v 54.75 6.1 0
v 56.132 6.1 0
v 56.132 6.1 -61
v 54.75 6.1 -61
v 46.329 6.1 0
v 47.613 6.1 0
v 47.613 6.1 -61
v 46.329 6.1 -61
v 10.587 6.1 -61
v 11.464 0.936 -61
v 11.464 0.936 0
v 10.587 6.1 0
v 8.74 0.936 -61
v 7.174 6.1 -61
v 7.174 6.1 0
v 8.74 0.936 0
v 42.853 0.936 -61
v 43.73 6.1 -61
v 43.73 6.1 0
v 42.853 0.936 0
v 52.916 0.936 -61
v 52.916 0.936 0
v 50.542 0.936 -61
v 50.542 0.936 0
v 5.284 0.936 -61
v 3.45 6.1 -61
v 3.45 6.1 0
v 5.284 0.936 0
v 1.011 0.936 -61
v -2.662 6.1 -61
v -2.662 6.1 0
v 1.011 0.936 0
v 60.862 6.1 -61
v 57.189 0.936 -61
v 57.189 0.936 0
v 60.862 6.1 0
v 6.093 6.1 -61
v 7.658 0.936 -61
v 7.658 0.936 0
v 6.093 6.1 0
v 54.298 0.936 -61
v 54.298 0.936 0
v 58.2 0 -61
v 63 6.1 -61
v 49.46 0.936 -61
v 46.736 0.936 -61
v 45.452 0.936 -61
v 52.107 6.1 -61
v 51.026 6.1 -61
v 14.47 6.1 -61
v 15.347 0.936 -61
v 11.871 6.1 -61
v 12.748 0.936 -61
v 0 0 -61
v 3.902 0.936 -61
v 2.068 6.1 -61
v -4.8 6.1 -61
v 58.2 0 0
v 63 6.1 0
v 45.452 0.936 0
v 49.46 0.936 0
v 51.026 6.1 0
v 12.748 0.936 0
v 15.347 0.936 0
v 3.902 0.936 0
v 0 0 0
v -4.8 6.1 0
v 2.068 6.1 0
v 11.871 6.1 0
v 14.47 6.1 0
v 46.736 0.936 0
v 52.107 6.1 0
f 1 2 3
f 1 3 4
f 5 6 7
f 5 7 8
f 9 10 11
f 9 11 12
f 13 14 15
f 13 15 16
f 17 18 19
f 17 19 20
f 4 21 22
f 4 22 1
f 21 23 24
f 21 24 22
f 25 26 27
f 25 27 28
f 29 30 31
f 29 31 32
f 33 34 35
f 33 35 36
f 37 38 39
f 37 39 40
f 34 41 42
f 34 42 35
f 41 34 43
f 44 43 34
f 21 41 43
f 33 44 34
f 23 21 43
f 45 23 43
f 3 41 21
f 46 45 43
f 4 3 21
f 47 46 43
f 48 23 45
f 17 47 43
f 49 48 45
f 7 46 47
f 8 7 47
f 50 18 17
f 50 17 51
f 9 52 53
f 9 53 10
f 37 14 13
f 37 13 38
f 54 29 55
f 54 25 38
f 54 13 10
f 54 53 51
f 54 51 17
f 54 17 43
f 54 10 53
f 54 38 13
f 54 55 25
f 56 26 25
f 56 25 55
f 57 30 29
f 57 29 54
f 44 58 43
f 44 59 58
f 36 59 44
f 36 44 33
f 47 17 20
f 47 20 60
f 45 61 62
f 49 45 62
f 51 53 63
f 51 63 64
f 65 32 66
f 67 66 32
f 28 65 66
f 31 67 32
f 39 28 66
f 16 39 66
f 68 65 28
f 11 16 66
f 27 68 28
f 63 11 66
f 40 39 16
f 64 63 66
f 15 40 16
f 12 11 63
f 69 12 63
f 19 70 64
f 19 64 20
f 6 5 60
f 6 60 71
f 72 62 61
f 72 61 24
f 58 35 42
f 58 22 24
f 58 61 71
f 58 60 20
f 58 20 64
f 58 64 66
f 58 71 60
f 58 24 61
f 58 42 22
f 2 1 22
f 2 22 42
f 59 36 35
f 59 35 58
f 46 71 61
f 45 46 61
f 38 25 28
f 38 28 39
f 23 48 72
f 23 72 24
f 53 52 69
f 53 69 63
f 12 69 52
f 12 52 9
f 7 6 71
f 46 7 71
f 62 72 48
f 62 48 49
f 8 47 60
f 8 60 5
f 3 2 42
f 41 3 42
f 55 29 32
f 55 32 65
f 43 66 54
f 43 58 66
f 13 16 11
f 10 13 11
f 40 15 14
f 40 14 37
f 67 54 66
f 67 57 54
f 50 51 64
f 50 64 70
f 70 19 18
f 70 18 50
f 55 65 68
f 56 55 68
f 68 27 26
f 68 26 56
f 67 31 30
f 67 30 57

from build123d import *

# Parameters (mm, degrees)
CUT_EXTRUDE1_START = -61
CUT_EXTRUDE1_DEPTH = 61


# Read off the part's stored shape, not the designer's step: Cut-Extrude1
with BuildPart() as part:
    # Sketch1 → Loft1 section 0
    with BuildSketch(Plane(origin=(0, 0, 0), x_dir=(1, 0, 0), z_dir=(0, 1, 0))):
        with BuildLine():
            Line((0, 0), (58.2, 0))
            Line((58.2, 0), (58.2, 61))
            Line((58.2, 61), (0, 61))
            Line((0, 61), (0, 0))
        make_face()
    # Sketch2 → Loft1 section 1
    with BuildSketch(Plane(origin=(0, 6.099999992, 0), x_dir=(1, 0, 0), z_dir=(0, 1, 0))):
        with BuildLine():
            Line((-4.8, 61), (63, 61))
            Line((63, 61), (63, 0))
            Line((63, 0), (-4.8, 0))
            Line((-4.8, 0), (-4.8, 61))
        make_face()
    loft()

    # Cut-Extrude1 outline → Cut-Extrude1 (cut)
    with BuildSketch(Plane.XY.offset(CUT_EXTRUDE1_START)):
        Polygon((60.861632844, 6.099999992), (56.132109475, 6.099999992), (54.298183465, 0.936182189), (57.189353849, 0.936182189), align=None)
        Polygon((54.750384399, 6.099999992), (52.107282262, 6.099999992), (50.541618156, 0.936182189), (52.916458389, 0.936182189), align=None)
        Polygon((51.025910518, 6.099999992), (47.612762768, 6.099999992), (46.735990868, 0.936182189), (49.460246412, 0.936182189), align=None)
        Polygon((46.328918201, 6.099999992), (43.729915785, 6.099999992), (42.853143886, 0.936182189), (45.452146301, 0.936182189), align=None)
        Polygon((14.470084215, 6.099999992), (11.871081799, 6.099999992), (12.747853699, 0.936182189), (15.346856114, 0.936182189), align=None)
        Polygon((10.587237232, 6.099999992), (7.174089482, 6.099999992), (8.739753588, 0.936182189), (11.464009132, 0.936182189), align=None)
        Polygon((6.092717738, 6.099999992), (3.449615601, 6.099999992), (5.283541611, 0.936182189), (7.658381844, 0.936182189), align=None)
        Polygon((1.010646151, 0.936182189), (3.901816535, 0.936182189), (2.067890525, 6.099999992), (-2.661632844, 6.099999992), align=None)
    extrude(amount=CUT_EXTRUDE1_DEPTH, mode=Mode.SUBTRACT)


solid = part.part
